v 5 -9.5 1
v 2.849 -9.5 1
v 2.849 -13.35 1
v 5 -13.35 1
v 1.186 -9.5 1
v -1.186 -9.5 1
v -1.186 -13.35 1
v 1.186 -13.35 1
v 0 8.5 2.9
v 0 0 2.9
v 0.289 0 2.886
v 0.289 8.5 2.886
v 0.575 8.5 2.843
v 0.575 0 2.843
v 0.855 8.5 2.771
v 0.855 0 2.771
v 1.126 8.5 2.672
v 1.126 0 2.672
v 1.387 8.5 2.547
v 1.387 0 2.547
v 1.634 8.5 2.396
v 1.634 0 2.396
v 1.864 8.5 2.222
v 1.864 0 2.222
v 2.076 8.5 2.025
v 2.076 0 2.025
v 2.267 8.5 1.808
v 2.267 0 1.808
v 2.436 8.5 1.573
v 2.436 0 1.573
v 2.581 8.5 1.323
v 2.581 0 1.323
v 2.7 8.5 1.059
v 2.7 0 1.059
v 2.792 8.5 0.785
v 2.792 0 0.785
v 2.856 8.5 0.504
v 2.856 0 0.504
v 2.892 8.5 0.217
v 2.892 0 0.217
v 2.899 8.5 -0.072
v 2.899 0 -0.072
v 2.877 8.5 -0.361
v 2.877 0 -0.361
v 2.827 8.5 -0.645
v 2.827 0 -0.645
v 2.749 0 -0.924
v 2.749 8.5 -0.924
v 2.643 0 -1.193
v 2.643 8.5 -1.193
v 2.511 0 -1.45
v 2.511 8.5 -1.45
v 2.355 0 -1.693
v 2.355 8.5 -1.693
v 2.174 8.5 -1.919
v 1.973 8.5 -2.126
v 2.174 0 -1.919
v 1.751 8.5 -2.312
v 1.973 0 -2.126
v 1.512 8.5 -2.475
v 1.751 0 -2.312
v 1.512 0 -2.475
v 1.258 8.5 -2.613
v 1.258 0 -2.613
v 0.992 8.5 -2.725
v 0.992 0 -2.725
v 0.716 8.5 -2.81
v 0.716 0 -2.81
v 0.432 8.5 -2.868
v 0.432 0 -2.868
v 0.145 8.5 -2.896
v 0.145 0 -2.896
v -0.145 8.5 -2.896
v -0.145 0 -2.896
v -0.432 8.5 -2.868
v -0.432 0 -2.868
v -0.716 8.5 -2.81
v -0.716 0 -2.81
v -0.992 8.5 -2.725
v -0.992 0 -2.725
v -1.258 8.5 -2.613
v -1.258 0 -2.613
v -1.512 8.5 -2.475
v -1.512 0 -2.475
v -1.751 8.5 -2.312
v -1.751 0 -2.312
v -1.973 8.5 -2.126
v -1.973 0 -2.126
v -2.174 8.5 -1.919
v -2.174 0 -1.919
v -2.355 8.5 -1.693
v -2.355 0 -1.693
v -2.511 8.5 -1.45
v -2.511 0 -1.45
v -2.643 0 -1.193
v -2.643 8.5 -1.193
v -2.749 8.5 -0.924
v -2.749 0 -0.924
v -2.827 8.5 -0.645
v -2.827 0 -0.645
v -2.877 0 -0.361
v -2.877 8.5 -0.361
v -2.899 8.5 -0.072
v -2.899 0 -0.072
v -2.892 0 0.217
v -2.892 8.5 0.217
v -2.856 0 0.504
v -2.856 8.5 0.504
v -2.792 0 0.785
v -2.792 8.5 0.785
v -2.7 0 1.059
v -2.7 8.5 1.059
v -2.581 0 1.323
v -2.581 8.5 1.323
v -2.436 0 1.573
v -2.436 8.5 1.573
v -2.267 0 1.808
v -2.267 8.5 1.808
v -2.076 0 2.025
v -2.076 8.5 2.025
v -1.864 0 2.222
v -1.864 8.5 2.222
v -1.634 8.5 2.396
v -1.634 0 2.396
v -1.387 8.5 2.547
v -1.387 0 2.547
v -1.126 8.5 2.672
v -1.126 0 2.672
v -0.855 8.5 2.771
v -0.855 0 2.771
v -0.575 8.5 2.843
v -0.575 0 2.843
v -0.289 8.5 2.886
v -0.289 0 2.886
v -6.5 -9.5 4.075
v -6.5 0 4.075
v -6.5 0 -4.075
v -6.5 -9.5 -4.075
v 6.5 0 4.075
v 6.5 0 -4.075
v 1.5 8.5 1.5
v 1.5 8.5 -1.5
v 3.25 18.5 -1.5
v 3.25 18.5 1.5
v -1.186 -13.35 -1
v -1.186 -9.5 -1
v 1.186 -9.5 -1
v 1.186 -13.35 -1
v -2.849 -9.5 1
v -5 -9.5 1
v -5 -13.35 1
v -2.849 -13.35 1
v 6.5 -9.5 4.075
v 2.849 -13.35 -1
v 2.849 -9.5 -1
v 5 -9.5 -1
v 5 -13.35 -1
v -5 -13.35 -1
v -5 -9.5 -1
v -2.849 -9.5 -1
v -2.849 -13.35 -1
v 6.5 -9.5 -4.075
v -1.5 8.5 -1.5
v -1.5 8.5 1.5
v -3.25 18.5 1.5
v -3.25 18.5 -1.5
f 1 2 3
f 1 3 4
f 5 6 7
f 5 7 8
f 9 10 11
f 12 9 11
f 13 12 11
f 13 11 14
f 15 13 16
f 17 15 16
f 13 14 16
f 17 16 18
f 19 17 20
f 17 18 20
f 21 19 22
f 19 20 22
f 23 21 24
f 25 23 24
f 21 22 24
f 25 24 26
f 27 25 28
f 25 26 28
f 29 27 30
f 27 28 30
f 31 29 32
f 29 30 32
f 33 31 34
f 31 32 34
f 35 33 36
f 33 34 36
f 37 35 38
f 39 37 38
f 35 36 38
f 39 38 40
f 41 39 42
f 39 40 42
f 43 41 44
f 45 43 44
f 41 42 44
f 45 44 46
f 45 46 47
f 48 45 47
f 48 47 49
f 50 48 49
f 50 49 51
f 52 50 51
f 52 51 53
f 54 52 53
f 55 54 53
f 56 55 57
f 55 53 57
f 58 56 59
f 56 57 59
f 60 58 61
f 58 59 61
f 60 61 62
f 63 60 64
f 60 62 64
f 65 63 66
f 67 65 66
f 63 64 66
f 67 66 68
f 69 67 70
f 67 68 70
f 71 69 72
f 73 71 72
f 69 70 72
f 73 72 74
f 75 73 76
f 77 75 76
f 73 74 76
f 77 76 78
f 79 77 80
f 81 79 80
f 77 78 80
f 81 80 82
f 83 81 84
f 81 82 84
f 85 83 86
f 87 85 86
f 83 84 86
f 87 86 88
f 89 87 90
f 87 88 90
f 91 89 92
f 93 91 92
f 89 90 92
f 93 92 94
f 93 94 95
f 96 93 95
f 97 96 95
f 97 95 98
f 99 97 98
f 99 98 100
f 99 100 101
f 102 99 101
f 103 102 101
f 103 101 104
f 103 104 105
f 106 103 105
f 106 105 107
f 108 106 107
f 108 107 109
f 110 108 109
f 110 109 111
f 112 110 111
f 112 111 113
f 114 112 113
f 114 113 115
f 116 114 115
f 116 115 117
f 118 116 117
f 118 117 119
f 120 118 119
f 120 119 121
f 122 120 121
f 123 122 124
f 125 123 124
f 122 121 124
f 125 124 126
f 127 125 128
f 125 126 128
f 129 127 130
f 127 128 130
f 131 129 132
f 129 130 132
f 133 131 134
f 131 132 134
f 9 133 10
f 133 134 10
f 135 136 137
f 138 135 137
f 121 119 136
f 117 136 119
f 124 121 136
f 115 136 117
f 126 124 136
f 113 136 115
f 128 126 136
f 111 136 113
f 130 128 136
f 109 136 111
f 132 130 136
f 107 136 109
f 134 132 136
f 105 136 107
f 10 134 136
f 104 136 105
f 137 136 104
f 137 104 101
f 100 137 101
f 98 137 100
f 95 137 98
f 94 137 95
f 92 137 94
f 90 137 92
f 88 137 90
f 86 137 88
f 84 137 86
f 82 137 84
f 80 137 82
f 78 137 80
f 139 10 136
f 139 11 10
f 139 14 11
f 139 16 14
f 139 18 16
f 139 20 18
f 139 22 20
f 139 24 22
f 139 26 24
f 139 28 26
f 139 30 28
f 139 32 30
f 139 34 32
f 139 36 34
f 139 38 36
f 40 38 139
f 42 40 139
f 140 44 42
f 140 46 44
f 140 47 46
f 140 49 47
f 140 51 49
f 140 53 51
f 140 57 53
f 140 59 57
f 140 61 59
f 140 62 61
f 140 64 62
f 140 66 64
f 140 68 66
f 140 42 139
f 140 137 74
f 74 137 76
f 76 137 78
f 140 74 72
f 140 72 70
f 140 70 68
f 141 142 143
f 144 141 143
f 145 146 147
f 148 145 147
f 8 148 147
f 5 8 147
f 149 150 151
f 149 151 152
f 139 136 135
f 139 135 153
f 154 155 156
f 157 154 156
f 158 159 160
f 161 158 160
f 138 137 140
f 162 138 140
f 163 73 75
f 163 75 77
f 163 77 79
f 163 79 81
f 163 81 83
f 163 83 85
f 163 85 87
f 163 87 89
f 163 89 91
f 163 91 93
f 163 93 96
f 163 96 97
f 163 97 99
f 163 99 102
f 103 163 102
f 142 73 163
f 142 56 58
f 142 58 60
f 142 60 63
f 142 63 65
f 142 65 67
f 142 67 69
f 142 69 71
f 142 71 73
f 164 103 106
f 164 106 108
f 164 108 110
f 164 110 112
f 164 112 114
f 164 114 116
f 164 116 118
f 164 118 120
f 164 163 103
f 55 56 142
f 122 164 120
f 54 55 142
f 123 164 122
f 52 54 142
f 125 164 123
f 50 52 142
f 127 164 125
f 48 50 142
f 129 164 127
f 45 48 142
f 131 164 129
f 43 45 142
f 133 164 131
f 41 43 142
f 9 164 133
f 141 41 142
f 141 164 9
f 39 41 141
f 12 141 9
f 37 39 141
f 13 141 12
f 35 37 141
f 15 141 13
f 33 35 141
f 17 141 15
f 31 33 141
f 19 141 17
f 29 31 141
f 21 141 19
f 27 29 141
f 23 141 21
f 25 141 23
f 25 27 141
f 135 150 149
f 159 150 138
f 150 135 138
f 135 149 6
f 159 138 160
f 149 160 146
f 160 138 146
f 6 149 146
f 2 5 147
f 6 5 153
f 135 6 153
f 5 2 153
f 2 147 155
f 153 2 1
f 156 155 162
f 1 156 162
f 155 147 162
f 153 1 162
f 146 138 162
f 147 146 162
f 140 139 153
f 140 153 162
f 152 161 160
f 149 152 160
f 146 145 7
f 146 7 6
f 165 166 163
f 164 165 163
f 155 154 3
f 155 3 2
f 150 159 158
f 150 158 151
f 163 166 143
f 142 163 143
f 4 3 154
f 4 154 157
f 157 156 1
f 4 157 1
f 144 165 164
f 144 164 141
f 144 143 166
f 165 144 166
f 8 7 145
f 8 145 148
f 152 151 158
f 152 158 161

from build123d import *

# Parameters (mm, degrees)
SKETCH1_W                = 13
SKETCH1_H                = 8.15
BOSS_EXTRUDE1_DEPTH      = 9.5
SKETCH2_R                = 2.9
BOSS_EXTRUDE2_DEPTH      = 8.5
BOSS_EXTRUDE3_DEPTH      = 1.5
BOSS_EXTRUDE3_DEPTH_BACK = 1.5
SKETCH4_W                = 10
SKETCH4_H                = 2
BOSS_EXTRUDE4_DEPTH      = 3.85
CUT_EXTRUDE1_DEPTH       = 21.027621551
CUT_EXTRUDE1_DEPTH_BACK  = 21.027621551
SKETCH5_W                = 1.66278511
SKETCH5_H                = 3.85


with BuildPart() as part:
    # Sketch1 → Boss-Extrude1 (new body)
    with BuildSketch(Plane(origin=(0, 0, 0), x_dir=(1, 0, 0), z_dir=(0, 1, 0))):
        Rectangle(SKETCH1_W, SKETCH1_H)
    extrude(amount=-BOSS_EXTRUDE1_DEPTH)

    # Sketch2 → Boss-Extrude2 (add)
    with BuildSketch(Plane(origin=(0, 0, 0), x_dir=(1, 0, 0), z_dir=(0, 1, 0))):
        with Locations(Location((0, 0, 0), (0, 0, 270))):
            Circle(SKETCH2_R)
    extrude(amount=BOSS_EXTRUDE2_DEPTH)

    # Sketch3 → Boss-Extrude3 (add, two sides: drawn at the far end of the back side and taken through both)
    with BuildSketch(Plane.XY.offset(-BOSS_EXTRUDE3_DEPTH_BACK)):
        Polygon((3.25, 18.5), (-3.25, 18.5), (-1.5, 8.5), (1.5, 8.5), align=None)
    extrude(amount=BOSS_EXTRUDE3_DEPTH + BOSS_EXTRUDE3_DEPTH_BACK)

    # Sketch4 → Boss-Extrude4 (add)
    with BuildSketch(Plane.XZ.offset(9.5)):
        Rectangle(SKETCH4_W, SKETCH4_H)
    extrude(amount=BOSS_EXTRUDE4_DEPTH)

    # Sketch5 → Cut-Extrude1 (cut, two sides: drawn at the far end of the back side and taken through both)
    with BuildSketch(Plane.XY.offset(-CUT_EXTRUDE1_DEPTH_BACK)):
        with Locations((-2.017335511, -11.425)):
            Rectangle(SKETCH5_W, SKETCH5_H)
        with Locations((2.017335511, -11.425)):
            Rectangle(SKETCH5_W, SKETCH5_H)
    extrude(amount=CUT_EXTRUDE1_DEPTH + CUT_EXTRUDE1_DEPTH_BACK, mode=Mode.SUBTRACT)


solid = part.part
